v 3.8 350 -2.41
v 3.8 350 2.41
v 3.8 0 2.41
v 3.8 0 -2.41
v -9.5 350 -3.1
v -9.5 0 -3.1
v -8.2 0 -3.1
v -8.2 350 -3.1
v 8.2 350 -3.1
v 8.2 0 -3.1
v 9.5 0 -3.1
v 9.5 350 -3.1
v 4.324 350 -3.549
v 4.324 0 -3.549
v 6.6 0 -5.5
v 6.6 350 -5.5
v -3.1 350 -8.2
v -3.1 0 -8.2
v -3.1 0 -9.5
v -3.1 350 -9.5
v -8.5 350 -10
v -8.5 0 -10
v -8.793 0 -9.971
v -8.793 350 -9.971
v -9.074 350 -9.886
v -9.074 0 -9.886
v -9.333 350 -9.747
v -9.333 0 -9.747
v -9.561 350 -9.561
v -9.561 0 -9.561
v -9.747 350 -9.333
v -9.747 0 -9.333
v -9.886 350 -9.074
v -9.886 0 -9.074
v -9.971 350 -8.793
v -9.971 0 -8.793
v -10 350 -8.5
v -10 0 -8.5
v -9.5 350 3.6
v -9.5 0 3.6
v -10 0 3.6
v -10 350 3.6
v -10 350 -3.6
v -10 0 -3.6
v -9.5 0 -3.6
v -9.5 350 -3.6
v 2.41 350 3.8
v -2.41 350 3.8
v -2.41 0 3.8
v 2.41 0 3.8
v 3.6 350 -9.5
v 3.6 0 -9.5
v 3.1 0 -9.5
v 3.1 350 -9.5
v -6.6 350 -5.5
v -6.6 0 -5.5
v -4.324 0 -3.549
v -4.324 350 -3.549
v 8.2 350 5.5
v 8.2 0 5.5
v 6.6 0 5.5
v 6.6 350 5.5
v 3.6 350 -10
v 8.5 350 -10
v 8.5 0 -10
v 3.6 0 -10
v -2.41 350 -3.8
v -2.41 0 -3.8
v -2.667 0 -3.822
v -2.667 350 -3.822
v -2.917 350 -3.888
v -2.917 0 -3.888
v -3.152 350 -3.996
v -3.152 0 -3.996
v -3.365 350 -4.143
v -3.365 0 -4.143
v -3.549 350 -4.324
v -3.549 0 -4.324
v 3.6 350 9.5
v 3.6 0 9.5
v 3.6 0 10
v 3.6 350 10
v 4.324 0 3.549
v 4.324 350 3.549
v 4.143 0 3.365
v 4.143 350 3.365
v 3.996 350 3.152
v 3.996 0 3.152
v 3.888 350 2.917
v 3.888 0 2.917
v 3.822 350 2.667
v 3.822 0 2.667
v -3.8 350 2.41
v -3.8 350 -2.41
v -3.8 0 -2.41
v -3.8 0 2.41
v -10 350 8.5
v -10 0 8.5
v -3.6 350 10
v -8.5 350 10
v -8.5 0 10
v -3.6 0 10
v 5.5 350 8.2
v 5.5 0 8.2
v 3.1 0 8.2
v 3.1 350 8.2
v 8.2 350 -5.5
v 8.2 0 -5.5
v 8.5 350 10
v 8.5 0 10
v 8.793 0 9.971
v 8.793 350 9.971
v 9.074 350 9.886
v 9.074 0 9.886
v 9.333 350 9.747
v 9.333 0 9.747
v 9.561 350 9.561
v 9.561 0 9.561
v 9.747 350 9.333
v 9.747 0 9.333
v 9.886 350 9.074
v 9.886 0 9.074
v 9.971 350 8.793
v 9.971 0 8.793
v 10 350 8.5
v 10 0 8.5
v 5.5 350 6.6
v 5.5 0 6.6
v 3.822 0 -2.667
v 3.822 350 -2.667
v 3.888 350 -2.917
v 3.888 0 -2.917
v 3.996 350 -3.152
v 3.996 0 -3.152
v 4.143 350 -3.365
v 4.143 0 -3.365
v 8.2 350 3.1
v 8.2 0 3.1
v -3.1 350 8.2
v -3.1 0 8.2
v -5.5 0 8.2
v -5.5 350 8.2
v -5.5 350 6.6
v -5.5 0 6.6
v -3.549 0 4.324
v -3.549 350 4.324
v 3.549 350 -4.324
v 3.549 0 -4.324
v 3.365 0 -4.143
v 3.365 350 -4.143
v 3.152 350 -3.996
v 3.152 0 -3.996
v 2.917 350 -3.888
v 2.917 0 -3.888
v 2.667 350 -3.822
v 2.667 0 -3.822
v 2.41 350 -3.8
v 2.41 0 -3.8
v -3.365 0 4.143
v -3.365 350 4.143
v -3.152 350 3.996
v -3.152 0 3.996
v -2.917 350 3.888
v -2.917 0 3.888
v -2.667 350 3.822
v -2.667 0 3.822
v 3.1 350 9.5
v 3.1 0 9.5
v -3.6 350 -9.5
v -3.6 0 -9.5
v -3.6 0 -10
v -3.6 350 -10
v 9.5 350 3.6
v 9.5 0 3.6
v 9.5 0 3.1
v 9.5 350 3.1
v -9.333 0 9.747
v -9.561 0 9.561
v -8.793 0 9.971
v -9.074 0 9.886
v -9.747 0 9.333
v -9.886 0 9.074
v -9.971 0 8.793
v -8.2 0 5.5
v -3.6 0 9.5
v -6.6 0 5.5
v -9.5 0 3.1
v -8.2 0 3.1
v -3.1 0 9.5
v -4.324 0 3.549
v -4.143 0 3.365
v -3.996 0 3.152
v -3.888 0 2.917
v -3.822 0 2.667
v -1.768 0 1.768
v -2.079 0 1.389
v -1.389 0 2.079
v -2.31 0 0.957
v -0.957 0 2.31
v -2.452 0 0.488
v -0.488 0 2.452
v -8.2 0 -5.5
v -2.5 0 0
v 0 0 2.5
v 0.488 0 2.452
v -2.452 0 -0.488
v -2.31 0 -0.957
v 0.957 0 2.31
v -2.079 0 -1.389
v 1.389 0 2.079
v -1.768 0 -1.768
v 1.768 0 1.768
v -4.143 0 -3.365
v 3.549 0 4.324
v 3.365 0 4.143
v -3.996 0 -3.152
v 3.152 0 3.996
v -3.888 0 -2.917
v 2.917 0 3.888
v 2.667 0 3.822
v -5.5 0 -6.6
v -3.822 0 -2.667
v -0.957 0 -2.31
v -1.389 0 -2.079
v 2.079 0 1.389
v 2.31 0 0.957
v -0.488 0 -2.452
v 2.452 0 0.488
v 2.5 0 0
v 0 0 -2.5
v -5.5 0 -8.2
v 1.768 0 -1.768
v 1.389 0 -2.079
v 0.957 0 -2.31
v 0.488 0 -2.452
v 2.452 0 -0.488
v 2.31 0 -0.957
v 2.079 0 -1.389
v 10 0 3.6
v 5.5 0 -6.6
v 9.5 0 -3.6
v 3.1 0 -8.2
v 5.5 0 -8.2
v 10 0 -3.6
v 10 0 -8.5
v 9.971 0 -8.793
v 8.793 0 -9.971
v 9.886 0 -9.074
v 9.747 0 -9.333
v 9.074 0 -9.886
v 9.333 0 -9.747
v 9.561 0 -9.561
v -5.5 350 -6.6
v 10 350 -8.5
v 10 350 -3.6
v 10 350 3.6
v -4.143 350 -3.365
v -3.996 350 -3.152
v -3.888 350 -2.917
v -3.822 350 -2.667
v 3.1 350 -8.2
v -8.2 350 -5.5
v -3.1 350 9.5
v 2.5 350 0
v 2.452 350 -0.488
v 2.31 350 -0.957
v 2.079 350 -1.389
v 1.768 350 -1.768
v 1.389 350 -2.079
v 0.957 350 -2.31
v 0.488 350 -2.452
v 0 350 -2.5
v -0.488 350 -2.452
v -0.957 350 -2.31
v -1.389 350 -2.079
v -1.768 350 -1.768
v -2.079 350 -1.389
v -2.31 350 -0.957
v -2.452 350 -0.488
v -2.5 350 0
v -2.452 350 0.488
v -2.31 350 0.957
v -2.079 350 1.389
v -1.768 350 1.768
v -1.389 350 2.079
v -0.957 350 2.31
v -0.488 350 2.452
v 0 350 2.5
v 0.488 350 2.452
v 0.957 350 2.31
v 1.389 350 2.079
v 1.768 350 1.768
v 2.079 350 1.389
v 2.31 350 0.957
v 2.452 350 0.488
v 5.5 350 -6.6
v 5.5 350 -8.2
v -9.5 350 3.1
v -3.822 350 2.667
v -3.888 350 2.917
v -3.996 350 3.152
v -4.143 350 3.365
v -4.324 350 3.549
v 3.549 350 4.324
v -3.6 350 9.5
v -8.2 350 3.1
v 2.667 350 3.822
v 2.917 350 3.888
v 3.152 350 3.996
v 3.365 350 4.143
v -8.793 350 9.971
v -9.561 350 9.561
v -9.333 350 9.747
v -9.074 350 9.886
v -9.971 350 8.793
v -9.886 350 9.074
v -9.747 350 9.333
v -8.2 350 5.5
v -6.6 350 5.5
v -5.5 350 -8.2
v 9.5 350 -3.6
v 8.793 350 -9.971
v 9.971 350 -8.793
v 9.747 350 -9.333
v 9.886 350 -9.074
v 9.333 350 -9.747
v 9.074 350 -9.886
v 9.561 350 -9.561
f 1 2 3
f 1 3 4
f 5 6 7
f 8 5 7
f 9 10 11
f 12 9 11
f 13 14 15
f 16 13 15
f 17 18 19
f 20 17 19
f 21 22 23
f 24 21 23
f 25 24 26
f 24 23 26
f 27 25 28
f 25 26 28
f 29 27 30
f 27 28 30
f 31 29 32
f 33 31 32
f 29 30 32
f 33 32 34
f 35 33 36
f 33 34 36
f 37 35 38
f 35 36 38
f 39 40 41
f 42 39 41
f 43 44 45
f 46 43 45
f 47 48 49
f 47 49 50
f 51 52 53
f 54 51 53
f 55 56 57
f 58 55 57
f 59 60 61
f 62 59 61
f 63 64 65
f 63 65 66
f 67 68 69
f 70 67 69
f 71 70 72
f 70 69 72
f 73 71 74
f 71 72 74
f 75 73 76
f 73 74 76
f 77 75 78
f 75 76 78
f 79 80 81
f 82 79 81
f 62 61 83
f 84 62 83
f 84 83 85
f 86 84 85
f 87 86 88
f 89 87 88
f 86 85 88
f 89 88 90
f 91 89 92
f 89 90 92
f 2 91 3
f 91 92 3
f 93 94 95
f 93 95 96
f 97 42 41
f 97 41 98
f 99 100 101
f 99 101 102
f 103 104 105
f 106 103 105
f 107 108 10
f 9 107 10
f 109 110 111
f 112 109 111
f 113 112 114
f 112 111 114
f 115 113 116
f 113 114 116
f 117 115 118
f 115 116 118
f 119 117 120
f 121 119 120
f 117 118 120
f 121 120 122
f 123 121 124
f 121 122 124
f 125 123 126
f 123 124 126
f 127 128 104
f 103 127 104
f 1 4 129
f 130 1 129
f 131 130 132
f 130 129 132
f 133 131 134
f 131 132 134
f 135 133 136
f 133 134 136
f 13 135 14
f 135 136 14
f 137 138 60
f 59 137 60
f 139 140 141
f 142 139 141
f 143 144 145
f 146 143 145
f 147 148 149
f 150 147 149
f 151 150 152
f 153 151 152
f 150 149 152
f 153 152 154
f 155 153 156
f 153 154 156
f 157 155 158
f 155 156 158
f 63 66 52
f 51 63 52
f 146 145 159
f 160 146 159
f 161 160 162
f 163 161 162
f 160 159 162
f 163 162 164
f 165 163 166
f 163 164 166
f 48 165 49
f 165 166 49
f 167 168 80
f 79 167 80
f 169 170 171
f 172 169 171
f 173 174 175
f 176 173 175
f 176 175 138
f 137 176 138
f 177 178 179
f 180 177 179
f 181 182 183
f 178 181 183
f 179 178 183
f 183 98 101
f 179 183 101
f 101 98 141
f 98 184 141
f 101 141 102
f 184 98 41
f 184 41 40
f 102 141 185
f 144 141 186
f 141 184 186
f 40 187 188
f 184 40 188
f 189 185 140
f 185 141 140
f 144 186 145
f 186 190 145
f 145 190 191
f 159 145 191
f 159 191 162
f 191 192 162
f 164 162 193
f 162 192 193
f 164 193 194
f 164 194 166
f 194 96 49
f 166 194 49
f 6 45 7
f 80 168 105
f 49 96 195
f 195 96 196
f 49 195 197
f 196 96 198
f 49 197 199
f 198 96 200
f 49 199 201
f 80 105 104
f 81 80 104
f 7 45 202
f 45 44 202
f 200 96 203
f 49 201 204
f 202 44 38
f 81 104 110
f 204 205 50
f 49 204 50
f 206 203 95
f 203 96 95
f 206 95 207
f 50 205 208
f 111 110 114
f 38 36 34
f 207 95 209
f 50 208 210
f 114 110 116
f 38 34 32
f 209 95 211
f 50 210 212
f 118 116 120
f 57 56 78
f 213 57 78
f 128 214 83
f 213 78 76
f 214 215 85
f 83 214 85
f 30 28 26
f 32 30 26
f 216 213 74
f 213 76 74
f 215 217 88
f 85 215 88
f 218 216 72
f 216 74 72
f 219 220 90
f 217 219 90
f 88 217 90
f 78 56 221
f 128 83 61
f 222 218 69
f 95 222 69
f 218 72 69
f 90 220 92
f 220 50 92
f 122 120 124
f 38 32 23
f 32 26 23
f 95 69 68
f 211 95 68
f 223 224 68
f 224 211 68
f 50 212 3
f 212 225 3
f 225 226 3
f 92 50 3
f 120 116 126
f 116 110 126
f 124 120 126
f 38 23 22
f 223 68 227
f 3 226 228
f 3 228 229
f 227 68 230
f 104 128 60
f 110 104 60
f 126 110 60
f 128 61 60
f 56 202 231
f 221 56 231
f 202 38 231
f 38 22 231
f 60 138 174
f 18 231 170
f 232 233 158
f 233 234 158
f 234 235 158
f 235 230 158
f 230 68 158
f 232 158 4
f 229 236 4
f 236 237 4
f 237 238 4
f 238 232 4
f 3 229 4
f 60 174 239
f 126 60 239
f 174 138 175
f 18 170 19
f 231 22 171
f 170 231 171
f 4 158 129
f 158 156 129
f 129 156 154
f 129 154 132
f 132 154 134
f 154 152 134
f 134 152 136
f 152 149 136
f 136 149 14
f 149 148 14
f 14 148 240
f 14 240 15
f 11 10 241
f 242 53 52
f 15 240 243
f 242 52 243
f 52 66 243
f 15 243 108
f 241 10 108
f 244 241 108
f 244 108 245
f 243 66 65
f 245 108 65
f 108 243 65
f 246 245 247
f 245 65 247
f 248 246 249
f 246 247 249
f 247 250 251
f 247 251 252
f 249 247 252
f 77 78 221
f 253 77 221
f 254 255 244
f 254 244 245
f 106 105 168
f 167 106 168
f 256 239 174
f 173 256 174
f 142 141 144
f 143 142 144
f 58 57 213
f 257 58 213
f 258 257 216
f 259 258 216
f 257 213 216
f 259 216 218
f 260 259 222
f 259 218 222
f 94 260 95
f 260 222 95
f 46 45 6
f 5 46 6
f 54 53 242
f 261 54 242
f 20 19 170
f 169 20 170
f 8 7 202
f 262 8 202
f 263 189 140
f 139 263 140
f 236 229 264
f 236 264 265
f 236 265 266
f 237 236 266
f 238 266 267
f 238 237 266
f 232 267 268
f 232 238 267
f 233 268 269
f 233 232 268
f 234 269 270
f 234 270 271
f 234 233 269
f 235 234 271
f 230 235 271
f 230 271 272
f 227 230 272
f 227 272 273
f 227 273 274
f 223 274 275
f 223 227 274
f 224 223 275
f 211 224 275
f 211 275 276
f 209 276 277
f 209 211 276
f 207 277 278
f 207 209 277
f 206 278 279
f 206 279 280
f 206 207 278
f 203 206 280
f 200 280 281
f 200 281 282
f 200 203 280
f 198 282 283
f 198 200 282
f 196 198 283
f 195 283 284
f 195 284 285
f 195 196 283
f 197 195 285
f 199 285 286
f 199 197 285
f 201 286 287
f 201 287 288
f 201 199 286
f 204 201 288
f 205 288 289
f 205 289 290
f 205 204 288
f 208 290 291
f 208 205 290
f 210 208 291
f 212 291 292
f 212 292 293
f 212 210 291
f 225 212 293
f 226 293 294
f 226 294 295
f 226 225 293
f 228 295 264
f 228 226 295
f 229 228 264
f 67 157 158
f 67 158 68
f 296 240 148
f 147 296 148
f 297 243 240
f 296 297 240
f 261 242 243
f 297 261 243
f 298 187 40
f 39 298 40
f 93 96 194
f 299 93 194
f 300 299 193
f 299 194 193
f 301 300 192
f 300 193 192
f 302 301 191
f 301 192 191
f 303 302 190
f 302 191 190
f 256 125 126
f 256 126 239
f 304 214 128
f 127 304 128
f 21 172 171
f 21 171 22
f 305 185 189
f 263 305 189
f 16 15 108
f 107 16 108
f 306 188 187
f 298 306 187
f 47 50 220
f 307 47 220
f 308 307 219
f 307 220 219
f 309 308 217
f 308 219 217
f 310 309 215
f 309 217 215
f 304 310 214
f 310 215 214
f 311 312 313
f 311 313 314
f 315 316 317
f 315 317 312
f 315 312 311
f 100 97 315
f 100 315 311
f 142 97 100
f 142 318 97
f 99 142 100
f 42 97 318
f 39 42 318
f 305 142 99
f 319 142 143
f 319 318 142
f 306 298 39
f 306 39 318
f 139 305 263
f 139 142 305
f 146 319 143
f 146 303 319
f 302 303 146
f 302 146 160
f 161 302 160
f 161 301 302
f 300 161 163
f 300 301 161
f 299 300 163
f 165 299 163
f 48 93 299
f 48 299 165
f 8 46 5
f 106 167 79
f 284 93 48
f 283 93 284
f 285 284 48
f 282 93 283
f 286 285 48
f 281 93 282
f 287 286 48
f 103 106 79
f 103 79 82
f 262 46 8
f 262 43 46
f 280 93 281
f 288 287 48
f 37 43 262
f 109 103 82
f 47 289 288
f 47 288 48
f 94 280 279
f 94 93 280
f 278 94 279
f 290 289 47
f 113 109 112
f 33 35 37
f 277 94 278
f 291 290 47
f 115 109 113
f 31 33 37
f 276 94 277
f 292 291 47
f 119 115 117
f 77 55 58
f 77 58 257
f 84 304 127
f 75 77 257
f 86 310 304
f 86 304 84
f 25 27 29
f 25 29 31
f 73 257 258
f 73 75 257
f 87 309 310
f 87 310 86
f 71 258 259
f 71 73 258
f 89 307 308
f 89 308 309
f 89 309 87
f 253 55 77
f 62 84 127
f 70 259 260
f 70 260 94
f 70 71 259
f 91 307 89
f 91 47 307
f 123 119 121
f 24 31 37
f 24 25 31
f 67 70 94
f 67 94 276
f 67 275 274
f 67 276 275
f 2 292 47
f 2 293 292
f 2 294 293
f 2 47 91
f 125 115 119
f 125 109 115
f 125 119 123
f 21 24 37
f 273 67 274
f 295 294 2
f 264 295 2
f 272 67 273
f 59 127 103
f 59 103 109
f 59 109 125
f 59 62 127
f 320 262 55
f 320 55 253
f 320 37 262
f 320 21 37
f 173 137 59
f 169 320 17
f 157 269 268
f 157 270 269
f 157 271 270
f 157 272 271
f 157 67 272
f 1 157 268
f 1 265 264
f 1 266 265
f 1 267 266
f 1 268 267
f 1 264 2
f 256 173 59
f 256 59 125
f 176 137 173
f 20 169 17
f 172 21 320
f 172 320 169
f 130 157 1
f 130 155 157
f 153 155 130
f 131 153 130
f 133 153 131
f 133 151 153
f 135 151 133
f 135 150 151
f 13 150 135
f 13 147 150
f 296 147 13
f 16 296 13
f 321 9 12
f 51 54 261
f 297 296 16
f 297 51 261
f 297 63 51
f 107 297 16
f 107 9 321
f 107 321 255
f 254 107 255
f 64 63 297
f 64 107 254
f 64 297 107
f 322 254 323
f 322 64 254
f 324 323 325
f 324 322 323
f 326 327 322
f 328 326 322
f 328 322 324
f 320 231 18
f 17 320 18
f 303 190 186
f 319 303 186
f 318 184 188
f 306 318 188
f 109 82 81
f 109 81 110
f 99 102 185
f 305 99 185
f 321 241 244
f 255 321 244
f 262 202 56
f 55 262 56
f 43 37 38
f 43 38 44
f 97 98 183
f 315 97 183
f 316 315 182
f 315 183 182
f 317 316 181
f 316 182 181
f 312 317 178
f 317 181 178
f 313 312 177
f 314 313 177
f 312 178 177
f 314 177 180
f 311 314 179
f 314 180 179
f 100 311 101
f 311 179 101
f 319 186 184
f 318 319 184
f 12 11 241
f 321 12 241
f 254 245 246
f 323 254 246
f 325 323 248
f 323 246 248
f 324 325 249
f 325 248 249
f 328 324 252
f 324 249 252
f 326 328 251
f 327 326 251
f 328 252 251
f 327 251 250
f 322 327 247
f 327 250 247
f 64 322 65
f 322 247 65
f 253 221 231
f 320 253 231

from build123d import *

# Parameters (mm, degrees)
SKETCH1_R           = 2.5
BOSS_EXTRUDE1_DEPTH = 350


with BuildPart() as part:
    # Sketch1 → Boss-Extrude1 (new body)
    with BuildSketch(Plane(origin=(0, 0, 0), x_dir=(1, 0, 0), z_dir=(0, 1, 0))):
        with BuildLine():
            ThreePointArc((-10, -8.5), (-9.560660172, -9.560660172), (-8.5, -10))
            Line((-8.5, -10), (-3.6, -10))
            Line((-3.6, -10), (-3.6, -9.5))
            Line((-3.6, -9.5), (-3.1, -9.5))
            Line((-3.1, -9.5), (-3.1, -8.2))
            Line((-3.1, -8.2), (-5.5, -8.2))
            Line((-5.5, -8.2), (-5.5, -6.6))
            Line((-5.5, -6.6), (-3.54898252, -4.32381294))
            ThreePointArc((-3.54898252, -4.32381294), (-3.036882831, -3.937230652), (-2.410097616, -3.8))
            Line((-2.410097616, -3.8), (2.410097616, -3.8))
            ThreePointArc((2.410097616, -3.8), (3.036882831, -3.937230652), (3.54898252, -4.32381294))
            Line((3.54898252, -4.32381294), (5.5, -6.6))
            Line((5.5, -6.6), (5.5, -8.2))
            Line((5.5, -8.2), (3.1, -8.2))
            Line((3.1, -8.2), (3.1, -9.5))
            Line((3.1, -9.5), (3.6, -9.5))
            Line((3.6, -9.5), (3.6, -10))
            Line((3.6, -10), (8.5, -10))
            ThreePointArc((8.5, -10), (9.560660172, -9.560660172), (10, -8.5))
            Line((10, -8.5), (10, -3.6))
            Line((10, -3.6), (9.5, -3.6))
            Line((9.5, -3.6), (9.5, -3.1))
            Line((9.5, -3.1), (8.2, -3.1))
            Line((8.2, -3.1), (8.2, -5.5))
            Line((8.2, -5.5), (6.6, -5.5))
            Line((6.6, -5.5), (4.32381294, -3.54898252))
            ThreePointArc((4.32381294, -3.54898252), (3.937230652, -3.036882831), (3.8, -2.410097616))
            Line((3.8, -2.410097616), (3.8, 2.410097616))
            ThreePointArc((3.8, 2.410097616), (3.937230652, 3.036882831), (4.32381294, 3.54898252))
            Line((4.32381294, 3.54898252), (6.6, 5.5))
            Line((6.6, 5.5), (8.2, 5.5))
            Line((8.2, 5.5), (8.2, 3.1))
            Line((8.2, 3.1), (9.5, 3.1))
            Line((9.5, 3.1), (9.5, 3.6))
            Line((9.5, 3.6), (10, 3.6))
            Line((10, 3.6), (10, 8.5))
            ThreePointArc((10, 8.5), (9.560660172, 9.560660172), (8.5, 10))
            Line((8.5, 10), (3.6, 10))
            Line((3.6, 10), (3.6, 9.5))
            Line((3.6, 9.5), (3.1, 9.5))
            Line((3.1, 9.5), (3.1, 8.2))
            Line((3.1, 8.2), (5.5, 8.2))
            Line((5.5, 8.2), (5.5, 6.6))
            Line((5.5, 6.6), (3.54898252, 4.32381294))
            ThreePointArc((3.54898252, 4.32381294), (3.036882831, 3.937230652), (2.410097616, 3.8))
            Line((2.410097616, 3.8), (-2.410097616, 3.8))
            ThreePointArc((-2.410097616, 3.8), (-3.036882831, 3.937230652), (-3.54898252, 4.32381294))
            Line((-3.54898252, 4.32381294), (-5.5, 6.6))
            Line((-5.5, 6.6), (-5.5, 8.2))
            Line((-5.5, 8.2), (-3.1, 8.2))
            Line((-3.1, 8.2), (-3.1, 9.5))
            Line((-3.1, 9.5), (-3.6, 9.5))
            Line((-3.6, 9.5), (-3.6, 10))
            Line((-3.6, 10), (-8.5, 10))
            ThreePointArc((-8.5, 10), (-9.560660172, 9.560660172), (-10, 8.5))
            Line((-10, 8.5), (-10, 3.6))
            Line((-10, 3.6), (-9.5, 3.6))
            Line((-9.5, 3.6), (-9.5, 3.1))
            Line((-9.5, 3.1), (-8.2, 3.1))
            Line((-8.2, 3.1), (-8.2, 5.5))
            Line((-8.2, 5.5), (-6.6, 5.5))
            Line((-6.6, 5.5), (-4.32381294, 3.54898252))
            ThreePointArc((-4.32381294, 3.54898252), (-3.937230652, 3.036882831), (-3.8, 2.410097616))
            Line((-3.8, 2.410097616), (-3.8, -2.410097616))
            ThreePointArc((-3.8, -2.410097616), (-3.937230652, -3.036882831), (-4.32381294, -3.54898252))
            Line((-4.32381294, -3.54898252), (-6.6, -5.5))
            Line((-6.6, -5.5), (-8.2, -5.5))
            Line((-8.2, -5.5), (-8.2, -3.1))
            Line((-8.2, -3.1), (-9.5, -3.1))
            Line((-9.5, -3.1), (-9.5, -3.6))
            Line((-9.5, -3.6), (-10, -3.6))
            Line((-10, -3.6), (-10, -8.5))
        make_face()
        Circle(SKETCH1_R, mode=Mode.SUBTRACT)
    extrude(amount=BOSS_EXTRUDE1_DEPTH)


solid = part.part
